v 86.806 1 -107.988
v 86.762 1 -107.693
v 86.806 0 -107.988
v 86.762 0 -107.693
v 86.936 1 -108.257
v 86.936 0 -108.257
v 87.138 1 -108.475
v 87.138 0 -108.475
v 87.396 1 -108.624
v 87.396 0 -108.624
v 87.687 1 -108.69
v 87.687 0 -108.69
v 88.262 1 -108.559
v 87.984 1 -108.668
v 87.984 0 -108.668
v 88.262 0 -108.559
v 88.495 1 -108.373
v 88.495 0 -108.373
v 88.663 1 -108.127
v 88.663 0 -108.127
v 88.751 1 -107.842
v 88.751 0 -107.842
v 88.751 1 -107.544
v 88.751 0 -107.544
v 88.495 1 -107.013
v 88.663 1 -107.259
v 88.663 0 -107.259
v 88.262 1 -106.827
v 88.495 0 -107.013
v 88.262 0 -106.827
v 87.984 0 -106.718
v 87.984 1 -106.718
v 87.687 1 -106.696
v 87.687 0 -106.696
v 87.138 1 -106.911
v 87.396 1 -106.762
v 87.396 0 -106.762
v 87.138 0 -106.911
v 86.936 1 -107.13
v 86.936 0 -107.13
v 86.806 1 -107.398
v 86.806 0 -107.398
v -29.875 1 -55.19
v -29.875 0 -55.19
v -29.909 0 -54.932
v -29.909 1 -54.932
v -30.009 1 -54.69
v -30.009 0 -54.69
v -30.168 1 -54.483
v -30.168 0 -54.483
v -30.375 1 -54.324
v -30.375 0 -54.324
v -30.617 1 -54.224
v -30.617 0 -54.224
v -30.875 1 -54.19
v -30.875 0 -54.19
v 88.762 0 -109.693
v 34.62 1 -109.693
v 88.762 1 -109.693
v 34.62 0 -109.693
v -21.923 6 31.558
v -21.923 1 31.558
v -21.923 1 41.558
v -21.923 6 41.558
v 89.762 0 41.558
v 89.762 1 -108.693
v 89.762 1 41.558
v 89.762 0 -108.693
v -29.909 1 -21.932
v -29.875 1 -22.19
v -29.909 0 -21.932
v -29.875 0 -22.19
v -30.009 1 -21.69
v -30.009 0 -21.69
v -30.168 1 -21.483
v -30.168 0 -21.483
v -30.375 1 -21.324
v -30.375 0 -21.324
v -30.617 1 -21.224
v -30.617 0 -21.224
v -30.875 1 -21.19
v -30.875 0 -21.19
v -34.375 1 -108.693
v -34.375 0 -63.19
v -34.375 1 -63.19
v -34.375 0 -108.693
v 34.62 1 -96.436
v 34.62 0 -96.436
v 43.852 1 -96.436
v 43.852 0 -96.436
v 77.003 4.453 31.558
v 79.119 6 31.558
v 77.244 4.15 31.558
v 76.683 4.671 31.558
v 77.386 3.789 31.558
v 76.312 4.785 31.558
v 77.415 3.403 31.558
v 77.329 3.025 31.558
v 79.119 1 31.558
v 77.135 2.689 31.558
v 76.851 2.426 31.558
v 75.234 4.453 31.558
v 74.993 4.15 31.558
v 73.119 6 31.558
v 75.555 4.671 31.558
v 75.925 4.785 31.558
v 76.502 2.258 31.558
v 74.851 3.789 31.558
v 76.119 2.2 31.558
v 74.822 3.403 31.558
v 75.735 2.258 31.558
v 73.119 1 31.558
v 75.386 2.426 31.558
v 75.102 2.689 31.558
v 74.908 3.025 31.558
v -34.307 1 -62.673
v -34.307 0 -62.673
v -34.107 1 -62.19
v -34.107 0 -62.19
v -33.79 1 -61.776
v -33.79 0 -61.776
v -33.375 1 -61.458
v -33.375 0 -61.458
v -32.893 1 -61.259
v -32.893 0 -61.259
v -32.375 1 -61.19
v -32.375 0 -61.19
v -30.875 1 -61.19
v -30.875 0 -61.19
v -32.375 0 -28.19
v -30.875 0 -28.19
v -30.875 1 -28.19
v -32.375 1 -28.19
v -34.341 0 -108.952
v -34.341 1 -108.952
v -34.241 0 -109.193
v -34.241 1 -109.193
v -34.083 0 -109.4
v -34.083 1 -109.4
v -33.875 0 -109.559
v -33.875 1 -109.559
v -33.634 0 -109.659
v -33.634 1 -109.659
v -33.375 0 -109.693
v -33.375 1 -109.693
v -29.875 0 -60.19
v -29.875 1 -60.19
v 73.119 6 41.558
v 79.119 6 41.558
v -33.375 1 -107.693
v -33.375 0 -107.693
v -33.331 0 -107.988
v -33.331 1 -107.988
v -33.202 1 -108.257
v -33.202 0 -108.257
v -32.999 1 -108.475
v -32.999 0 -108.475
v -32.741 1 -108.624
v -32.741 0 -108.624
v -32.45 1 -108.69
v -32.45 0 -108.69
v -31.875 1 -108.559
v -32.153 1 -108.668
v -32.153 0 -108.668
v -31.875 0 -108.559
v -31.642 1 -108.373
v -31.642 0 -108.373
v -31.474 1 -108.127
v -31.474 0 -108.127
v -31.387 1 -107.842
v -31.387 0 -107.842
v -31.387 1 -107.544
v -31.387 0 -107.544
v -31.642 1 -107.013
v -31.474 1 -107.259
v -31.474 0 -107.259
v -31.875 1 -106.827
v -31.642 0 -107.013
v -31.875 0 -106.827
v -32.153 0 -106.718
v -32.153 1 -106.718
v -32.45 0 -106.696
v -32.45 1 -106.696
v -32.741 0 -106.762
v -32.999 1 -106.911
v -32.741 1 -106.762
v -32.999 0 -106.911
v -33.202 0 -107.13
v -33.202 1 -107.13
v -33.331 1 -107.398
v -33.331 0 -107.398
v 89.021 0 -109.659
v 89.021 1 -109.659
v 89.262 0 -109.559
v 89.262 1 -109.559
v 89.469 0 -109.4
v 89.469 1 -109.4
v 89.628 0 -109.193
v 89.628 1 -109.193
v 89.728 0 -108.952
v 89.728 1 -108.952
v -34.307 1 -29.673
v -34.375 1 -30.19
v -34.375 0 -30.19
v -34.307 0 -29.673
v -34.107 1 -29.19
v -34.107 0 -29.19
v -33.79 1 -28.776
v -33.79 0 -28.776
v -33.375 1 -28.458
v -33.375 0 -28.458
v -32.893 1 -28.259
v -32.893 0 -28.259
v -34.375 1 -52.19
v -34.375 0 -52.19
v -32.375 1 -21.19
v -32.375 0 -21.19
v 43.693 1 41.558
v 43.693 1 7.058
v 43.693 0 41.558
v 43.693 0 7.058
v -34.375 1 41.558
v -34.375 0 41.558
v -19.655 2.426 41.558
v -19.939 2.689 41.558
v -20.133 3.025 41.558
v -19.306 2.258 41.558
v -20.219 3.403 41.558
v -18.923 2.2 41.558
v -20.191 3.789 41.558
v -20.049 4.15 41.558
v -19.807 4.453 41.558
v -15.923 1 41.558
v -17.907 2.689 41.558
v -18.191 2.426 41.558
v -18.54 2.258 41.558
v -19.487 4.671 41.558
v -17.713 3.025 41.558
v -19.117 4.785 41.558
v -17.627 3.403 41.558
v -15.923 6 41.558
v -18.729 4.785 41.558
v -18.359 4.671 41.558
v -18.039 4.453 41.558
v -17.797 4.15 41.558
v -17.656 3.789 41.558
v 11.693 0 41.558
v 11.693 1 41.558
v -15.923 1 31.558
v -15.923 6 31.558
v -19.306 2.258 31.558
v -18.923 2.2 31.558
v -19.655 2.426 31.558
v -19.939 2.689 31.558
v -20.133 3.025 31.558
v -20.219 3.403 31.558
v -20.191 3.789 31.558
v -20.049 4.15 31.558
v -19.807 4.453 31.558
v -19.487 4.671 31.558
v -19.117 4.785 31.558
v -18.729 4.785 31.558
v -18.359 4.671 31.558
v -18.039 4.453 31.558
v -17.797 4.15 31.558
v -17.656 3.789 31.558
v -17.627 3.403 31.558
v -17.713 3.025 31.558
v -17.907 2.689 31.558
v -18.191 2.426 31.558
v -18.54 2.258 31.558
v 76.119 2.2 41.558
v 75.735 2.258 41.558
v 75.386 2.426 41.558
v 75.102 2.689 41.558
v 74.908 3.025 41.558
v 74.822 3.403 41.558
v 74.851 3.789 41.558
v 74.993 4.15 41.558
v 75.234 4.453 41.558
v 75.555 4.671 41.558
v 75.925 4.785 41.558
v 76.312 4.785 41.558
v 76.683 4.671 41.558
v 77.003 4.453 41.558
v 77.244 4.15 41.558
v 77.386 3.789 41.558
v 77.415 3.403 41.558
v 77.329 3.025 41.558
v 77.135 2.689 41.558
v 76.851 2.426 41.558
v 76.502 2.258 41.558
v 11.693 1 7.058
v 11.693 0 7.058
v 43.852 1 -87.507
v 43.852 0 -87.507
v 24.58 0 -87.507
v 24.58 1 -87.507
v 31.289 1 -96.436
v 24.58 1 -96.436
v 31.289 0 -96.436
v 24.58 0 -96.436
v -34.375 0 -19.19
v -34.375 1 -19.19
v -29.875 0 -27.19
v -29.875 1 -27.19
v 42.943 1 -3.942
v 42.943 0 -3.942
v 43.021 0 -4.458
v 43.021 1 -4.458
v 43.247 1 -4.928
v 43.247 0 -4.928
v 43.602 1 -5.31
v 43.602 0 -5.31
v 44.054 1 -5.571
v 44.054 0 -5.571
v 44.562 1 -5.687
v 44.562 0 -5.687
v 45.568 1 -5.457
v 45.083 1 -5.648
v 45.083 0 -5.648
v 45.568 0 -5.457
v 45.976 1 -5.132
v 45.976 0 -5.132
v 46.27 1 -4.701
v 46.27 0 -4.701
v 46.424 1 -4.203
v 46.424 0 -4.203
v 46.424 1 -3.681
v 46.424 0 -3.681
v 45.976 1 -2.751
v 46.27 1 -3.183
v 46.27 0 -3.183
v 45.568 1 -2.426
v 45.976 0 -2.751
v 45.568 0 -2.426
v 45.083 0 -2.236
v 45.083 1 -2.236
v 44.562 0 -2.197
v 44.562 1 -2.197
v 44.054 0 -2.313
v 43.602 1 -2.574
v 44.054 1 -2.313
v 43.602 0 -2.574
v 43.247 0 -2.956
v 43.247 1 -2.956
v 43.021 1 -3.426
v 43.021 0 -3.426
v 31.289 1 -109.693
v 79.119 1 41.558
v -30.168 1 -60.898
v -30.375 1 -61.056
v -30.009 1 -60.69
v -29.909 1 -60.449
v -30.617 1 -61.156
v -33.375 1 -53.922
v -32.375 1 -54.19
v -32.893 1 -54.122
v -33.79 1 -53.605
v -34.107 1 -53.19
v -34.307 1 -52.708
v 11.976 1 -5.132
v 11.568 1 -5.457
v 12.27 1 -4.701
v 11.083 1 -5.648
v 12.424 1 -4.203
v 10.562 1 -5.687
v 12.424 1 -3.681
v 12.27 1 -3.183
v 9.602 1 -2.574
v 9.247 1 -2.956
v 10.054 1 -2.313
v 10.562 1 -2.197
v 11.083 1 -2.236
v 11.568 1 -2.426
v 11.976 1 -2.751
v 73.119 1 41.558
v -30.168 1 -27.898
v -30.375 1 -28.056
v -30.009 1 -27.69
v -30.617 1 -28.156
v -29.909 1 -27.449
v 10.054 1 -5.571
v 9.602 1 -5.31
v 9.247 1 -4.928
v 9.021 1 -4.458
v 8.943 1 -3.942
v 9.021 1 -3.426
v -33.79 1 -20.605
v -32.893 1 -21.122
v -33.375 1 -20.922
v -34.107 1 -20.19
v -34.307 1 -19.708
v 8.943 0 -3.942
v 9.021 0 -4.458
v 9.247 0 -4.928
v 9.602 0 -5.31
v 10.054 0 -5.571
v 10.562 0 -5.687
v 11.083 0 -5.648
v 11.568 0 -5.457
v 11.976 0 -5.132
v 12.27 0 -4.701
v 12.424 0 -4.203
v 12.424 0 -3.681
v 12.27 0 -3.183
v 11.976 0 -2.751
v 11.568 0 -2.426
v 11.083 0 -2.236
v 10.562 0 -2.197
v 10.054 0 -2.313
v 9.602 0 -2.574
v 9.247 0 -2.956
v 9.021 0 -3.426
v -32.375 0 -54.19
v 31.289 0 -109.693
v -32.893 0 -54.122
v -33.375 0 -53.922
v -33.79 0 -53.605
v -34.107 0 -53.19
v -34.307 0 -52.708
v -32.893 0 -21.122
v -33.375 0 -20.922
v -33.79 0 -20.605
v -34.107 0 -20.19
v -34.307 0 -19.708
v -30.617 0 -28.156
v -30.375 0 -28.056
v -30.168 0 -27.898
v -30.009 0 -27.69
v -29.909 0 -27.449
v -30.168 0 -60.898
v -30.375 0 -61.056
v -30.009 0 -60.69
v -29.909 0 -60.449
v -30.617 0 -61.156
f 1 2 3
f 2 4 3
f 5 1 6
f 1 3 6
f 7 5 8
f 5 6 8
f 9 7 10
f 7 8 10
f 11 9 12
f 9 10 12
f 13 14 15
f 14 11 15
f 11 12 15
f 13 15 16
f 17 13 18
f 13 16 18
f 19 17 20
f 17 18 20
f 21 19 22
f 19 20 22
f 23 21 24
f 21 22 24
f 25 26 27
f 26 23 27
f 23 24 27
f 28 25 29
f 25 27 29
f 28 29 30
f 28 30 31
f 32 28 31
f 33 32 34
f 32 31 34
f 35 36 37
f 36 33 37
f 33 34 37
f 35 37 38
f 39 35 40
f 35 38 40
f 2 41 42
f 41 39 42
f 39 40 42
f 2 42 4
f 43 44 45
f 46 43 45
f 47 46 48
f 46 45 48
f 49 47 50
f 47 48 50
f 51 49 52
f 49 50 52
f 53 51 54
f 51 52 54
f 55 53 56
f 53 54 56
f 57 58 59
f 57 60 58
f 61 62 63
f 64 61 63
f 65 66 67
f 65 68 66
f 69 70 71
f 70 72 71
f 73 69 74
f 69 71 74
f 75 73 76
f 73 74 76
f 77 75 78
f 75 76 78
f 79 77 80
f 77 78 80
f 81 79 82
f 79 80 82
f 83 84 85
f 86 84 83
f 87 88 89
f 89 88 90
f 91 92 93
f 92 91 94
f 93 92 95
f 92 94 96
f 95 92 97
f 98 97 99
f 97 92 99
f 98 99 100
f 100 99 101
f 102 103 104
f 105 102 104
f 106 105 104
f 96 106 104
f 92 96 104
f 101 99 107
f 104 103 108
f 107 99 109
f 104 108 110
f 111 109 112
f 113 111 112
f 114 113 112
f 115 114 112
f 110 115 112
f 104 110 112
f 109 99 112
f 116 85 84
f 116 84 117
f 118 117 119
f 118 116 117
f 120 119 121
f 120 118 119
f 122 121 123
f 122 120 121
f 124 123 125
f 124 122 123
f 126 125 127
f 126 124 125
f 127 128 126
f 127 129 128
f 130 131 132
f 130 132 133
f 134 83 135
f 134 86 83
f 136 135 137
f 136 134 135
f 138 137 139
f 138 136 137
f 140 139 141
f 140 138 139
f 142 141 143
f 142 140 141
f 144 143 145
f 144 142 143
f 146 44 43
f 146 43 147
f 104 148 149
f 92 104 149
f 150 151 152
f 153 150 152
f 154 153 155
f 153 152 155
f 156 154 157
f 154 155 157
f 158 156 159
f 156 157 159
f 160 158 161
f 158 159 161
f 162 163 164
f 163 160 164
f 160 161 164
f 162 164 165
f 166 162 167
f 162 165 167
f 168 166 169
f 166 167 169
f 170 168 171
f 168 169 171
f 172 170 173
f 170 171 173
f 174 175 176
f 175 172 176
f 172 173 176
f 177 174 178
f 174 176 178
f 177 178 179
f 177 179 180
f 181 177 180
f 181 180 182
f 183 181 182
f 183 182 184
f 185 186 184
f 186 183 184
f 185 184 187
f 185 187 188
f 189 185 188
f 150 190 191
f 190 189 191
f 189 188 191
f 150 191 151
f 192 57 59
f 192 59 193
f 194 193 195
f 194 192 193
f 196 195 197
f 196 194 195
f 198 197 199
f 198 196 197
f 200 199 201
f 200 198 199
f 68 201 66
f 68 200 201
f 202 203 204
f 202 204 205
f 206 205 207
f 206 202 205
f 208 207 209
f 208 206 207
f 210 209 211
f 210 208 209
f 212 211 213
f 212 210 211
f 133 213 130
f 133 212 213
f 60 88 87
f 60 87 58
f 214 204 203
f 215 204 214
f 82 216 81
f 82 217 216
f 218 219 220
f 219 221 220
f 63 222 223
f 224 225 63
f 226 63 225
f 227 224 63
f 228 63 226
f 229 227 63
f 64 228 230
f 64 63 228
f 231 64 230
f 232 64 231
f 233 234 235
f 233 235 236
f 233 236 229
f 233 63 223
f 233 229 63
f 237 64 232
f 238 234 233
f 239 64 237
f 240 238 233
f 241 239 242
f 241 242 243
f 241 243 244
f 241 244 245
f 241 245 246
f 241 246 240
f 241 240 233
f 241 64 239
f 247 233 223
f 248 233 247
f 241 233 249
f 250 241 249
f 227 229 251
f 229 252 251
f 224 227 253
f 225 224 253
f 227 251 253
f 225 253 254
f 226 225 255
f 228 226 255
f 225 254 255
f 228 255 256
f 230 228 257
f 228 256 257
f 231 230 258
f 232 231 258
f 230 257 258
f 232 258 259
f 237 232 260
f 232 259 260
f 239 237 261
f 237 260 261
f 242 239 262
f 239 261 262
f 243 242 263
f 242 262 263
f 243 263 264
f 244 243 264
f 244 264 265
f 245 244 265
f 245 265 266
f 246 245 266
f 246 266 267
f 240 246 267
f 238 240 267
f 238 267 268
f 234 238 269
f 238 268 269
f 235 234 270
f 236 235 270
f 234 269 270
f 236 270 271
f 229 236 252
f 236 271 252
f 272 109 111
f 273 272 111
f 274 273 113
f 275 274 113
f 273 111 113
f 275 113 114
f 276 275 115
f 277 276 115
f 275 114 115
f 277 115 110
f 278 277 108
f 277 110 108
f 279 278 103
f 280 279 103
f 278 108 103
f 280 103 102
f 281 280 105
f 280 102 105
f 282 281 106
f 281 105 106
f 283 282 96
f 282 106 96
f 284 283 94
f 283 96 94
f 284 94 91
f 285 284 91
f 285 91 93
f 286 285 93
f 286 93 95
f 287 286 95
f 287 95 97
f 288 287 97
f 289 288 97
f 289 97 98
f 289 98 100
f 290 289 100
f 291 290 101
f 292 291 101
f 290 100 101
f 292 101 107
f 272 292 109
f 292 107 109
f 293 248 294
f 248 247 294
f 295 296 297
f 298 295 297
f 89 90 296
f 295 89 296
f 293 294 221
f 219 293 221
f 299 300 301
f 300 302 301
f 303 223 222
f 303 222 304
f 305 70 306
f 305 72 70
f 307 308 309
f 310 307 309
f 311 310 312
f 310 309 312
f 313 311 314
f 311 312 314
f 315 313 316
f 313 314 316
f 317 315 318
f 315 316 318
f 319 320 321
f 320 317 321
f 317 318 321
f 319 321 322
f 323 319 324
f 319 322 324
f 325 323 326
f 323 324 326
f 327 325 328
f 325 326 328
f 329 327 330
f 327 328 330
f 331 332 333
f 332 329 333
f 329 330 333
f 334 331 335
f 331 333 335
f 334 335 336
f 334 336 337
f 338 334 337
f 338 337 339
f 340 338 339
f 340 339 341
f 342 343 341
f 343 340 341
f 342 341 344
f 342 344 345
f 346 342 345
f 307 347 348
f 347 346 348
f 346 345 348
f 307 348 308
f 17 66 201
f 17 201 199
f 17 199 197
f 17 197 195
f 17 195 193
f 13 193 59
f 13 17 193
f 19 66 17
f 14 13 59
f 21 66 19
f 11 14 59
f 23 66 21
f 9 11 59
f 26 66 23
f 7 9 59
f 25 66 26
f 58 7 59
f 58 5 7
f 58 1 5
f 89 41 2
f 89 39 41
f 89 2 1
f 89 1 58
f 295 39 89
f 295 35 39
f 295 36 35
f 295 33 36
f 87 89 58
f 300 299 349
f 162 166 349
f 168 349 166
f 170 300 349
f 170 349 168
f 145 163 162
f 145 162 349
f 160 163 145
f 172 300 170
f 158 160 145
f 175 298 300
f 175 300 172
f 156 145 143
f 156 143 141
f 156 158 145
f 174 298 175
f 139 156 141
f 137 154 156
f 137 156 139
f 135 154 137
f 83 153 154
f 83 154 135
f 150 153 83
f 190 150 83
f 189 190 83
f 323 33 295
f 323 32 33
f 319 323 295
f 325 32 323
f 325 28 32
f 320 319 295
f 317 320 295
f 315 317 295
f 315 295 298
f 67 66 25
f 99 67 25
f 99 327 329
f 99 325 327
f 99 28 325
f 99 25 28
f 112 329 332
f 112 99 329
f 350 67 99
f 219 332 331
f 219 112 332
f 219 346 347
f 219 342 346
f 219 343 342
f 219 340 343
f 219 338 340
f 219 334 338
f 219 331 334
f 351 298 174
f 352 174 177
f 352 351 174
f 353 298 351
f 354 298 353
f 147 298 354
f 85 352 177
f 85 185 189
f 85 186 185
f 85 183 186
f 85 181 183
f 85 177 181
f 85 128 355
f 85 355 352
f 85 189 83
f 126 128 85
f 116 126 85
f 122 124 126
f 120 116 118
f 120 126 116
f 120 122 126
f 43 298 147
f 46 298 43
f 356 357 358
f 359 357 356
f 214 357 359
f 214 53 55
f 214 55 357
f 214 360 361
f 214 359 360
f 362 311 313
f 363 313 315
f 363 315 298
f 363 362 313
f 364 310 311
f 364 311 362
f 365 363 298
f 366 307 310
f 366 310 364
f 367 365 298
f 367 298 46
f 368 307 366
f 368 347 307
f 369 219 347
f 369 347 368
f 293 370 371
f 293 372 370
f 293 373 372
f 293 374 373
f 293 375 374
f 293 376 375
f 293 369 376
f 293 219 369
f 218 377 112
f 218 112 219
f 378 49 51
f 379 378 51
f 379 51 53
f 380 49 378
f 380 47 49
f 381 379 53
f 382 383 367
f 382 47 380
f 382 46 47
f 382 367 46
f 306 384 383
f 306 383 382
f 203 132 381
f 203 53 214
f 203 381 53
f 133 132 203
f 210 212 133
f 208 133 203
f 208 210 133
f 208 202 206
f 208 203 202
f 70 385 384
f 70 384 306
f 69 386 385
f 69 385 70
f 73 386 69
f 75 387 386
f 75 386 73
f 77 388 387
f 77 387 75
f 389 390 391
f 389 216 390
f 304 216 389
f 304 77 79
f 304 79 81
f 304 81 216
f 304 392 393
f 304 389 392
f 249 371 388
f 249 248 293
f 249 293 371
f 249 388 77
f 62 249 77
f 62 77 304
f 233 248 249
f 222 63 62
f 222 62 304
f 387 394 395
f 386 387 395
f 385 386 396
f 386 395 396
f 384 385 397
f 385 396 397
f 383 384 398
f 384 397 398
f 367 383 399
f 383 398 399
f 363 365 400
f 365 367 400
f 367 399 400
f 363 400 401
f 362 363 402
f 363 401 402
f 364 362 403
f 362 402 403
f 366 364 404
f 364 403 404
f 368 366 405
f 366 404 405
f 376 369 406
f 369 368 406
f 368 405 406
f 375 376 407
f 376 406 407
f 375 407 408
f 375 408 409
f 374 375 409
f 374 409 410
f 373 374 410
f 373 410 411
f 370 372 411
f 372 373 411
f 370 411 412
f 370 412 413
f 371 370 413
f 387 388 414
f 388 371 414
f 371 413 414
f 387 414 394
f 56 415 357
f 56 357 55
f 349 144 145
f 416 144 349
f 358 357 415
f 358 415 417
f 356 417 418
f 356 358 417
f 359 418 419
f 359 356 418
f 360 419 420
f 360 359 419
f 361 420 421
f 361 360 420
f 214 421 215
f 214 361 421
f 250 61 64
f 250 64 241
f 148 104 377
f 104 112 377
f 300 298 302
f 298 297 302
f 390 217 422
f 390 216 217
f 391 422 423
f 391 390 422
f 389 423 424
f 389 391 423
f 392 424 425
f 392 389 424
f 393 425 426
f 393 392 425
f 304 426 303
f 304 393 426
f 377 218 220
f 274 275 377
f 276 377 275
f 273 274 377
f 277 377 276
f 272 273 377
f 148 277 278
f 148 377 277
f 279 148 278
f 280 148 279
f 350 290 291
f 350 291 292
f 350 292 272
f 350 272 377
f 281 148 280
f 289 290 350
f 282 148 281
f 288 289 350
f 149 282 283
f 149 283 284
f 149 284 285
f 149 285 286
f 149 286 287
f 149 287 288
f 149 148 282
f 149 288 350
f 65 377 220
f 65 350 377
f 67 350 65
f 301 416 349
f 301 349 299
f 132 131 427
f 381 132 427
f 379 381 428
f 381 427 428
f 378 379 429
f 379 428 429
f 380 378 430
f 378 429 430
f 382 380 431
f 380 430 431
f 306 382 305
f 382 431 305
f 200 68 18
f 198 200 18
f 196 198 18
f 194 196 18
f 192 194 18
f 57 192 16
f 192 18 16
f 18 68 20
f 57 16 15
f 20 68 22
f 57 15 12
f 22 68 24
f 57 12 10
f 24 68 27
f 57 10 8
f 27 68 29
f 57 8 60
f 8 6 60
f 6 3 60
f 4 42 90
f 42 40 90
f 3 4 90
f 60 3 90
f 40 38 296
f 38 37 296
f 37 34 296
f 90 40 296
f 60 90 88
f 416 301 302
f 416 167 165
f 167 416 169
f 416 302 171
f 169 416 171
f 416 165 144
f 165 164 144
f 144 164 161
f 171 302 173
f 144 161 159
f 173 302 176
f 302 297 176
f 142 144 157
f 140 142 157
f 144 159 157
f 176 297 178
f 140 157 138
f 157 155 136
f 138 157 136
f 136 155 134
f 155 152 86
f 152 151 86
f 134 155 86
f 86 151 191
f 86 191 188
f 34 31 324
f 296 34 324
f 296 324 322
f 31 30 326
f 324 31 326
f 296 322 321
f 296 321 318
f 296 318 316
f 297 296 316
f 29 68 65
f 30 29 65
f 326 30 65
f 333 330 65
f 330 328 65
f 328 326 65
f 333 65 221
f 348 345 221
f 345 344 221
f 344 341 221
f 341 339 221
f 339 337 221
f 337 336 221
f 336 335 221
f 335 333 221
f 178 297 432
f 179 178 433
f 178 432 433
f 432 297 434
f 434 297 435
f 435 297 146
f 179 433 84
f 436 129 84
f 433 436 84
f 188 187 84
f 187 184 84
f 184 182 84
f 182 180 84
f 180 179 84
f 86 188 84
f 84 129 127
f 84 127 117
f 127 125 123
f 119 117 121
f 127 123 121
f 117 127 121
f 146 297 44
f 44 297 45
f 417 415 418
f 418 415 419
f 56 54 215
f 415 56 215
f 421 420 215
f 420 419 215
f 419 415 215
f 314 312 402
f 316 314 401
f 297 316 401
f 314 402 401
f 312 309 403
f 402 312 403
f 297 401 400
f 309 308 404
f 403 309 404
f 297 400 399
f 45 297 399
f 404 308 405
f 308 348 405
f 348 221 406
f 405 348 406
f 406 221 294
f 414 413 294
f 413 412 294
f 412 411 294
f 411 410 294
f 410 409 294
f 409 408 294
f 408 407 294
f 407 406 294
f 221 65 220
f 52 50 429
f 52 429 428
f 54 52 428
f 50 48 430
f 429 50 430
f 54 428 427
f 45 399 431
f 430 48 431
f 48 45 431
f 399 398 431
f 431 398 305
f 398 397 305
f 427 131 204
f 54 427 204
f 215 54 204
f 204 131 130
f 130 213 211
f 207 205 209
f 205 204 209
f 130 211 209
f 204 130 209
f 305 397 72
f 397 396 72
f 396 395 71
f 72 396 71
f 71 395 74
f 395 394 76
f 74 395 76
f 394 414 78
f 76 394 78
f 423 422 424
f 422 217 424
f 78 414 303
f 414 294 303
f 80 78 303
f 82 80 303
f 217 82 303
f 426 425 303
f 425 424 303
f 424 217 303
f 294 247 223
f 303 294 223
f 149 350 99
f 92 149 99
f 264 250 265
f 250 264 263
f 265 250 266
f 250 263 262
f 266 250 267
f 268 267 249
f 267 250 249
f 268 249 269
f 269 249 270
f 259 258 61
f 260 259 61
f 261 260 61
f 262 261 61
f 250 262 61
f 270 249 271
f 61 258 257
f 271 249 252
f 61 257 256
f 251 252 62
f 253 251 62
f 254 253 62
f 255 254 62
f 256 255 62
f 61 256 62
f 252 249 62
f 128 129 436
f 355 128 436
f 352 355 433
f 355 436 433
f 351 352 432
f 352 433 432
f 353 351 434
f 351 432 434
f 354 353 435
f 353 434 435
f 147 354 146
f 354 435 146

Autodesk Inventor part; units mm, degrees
ref_plane "YZ Plane" through (0, 0, 0) normal (1, 0, 0) x (0, 1, 0)
ref_plane "XZ Plane" through (0, 0, 0) normal (0, 1, 0) x (-1, 0, 0)
ref_plane "XY Plane" through (0, 0, 0) normal (0, 0, 1) x (1, 0, 0)
sketch "Sketch1" plane through (0, 0, 0) normal (0, 1, 0) x (-1, 0, 0)
  line L0 (-90.1493, 193.0734) -> (34.8507, 193.0734) construction
  line L1 (34.8507, 193.0734) -> (34.8507, 51.5734) construction
  line L2 (34.8507, 51.5734) -> (28.8507, 51.5734) construction
  line L3 (28.8507, 51.5734) -> (28.8507, 31.5734) construction
  line L4 (34.8507, 31.5734) -> (28.8507, 31.5734) construction
  line L5 (34.8507, 31.5734) -> (34.8507, -109.9266) construction
  line L6 (34.8507, -109.9266) -> (-90.1493, -109.9266) construction
  line L7 (-90.1493, -109.9266) -> (-90.1493, 31.5734) construction
  line L8 (-90.1493, 31.5734) -> (-84.1493, 31.5734) construction
  line L9 (-84.1493, 51.5734) -> (-84.1493, 31.5734) construction
  line L10 (-90.1493, 51.5734) -> (-84.1493, 51.5734) construction
  line L11 (-90.1493, 51.5734) -> (-90.1493, 193.0734) construction
  line L12 (-91.6493, 194.5734) -> (-91.6493, -111.4266) construction
  line L13 (-91.6493, -111.4266) -> (36.3507, -111.4266) construction
  line L14 (36.3507, -111.4266) -> (36.3507, 194.5734) construction
  line L15 (36.3507, 194.5734) -> (-91.6493, 194.5734) construction
  circle A0 centre (-88.1493, -107.9266) radius 1.1 construction
  line L16 (-86.1493, -109.9266) -> (-90.1493, -109.9266) construction
  line L17 (-86.1493, -109.9266) -> (-86.1493, -105.9266) construction
  line L18 (-86.1493, -105.9266) -> (-90.1493, -105.9266) construction
  line L19 (-90.1493, -109.9266) -> (-90.1493, -105.9266) construction
  line L20 (34.8507, -109.9266) -> (30.8507, -109.9266) construction
  line L21 (34.8507, -105.9687) -> (34.8507, -109.9266) construction
  line L22 (34.8507, -105.9687) -> (30.8507, -105.9687) construction
  line L23 (30.8507, -105.9687) -> (30.8507, -109.9266) construction
  circle A1 centre (32.8507, -107.9687) radius 1.1 construction
  circle A2 centre (-88.1493, 191.0734) radius 1.1 construction
  line L24 (-90.1493, 189.0734) -> (-90.1493, 193.0734) construction
  line L25 (-90.1493, 189.0734) -> (-86.1493, 189.0734) construction
  line L26 (-86.1493, 189.0734) -> (-86.1493, 193.0734) construction
  line L27 (-90.1493, 193.0734) -> (-86.1493, 193.0734) construction
  circle A3 centre (32.8507, 191.0734) radius 1.1 construction
  line L28 (30.8507, 193.0734) -> (34.8507, 193.0734) construction
  line L29 (30.8507, 193.0734) -> (30.8507, 189.0734) construction
  line L30 (30.8507, 189.0734) -> (34.8507, 189.0734) construction
  line L31 (34.8507, 193.0734) -> (34.8507, 189.0734) construction
  point P0 (0, 0)
  point P1 (0, 0)
sketch "Sketch2" plane through (0, 0, 0) normal (0, 1, 0) x (-1, 0, 0)
  line L0 (-89.7618, 28.8226) -> (-89.7618, 191.8096)
  line L1 (-88.7618, 192.8096) -> (33.3754, 192.8096)
  line L2 (34.3754, 191.8096) -> (34.3754, -108.6932)
  line L3 (-89.7618, -108.6932) -> (-89.7618, 28.8226)
  circle A0 centre (-87.7618, -107.6932) radius 1
  circle A1 centre (32.3754, -107.6932) radius 1
  line L4 (34.3754, 28.9308) -> (34.3754, -108.6932)
  circle A2 centre (-87.7618, 190.8096) radius 1
  circle A3 centre (32.3754, 190.8096) radius 1
  arc A4 (34.3754, 191.8096) -> (33.3754, 192.8096) centre (33.3754, 191.8096) ccw
  arc A5 (-88.7618, 192.8096) -> (-89.7618, 191.8096) centre (-88.7618, 191.8096) ccw
  arc A6 (-89.7618, -108.6932) -> (-88.7618, -109.6932) centre (-88.7618, -108.6932) ccw
  arc A7 (33.3754, -109.6932) -> (34.3754, -108.6932) centre (33.3754, -108.6932) ccw
  line L5 (-43.6932, 76.0582) -> (-11.6932, 76.0582)
  line L6 (-11.6932, 76.0582) -> (-11.6932, 7.0582)
  line L7 (-11.6932, 7.0582) -> (-43.6932, 7.0582)
  line L8 (-43.6932, 7.0582) -> (-43.6932, 76.0582)
  circle A8 centre (-44.6932, 80.8582) radius 1.75
  circle A9 centre (-10.6932, 80.8582) radius 1.75
  circle A10 centre (-10.6932, -3.9418) radius 1.75
  circle A11 centre (-44.6932, -3.9418) radius 1.75
  line L9 (-43.8518, -87.5066) -> (-24.58, -87.5066)
  line L10 (-24.58, -87.5066) -> (-24.58, -96.4362)
  line L11 (-43.8518, -96.4362) -> (-43.8518, -87.5066)
  line L12 (-34.6195, -96.4362) -> (-34.6195, -109.6932)
  line L13 (-31.2888, -109.6932) -> (-31.2888, -96.4362)
  line L14 (-24.58, -96.4362) -> (-31.2888, -96.4362)
  line L15 (-34.6195, -96.4362) -> (-43.8518, -96.4362)
  line L16 (33.3754, -109.6932) -> (-31.2888, -109.6932)
  line L17 (-34.6195, -109.6932) -> (-88.7618, -109.6932)
  line L18 (34.0825, -109.4003) -> (-89.4689, 192.5167) construction
  line L19 (-89.4689, -109.4003) -> (34.0825, 192.5167) construction
  line L20 (-27.6932, 41.5582) -> (9.3943, 41.5582) construction
  point P0 (0, 0)
  point P1 (-89.7618, 188.8096)
  point P2 (-85.7618, 192.8096)
  point P3 (-89.7618, 192.8096)
  dimension "d3" = 1
  dimension "d47" = 69
  dimension "d48" = 32
  dimension "d52" = 34.5
  dimension "d53" = 16
  dimension "d54" = 3.5
  dimension "d55" = 3.5
  dimension "d56" = 3.5
  dimension "d57" = 3.5
  dimension "d59" = 0
  dimension "d62" = 0
  dimension "d64" = 0
  dimension "d65" = 0
  dimension "d66" = 11
  dimension "d67" = 4.8
  dimension "d68" = 1
  dimension "d69" = 1
  dimension "d87" = 2
  dimension "d88" = 2
  dimension "d89" = 2
  dimension "d90" = 2
  dimension "d91" = 2
  dimension "d92" = 2
  dimension "d93" = 2
  dimension "d94" = 2
  dimension "d95" = 2
  dimension "d96" = 2
  dimension "d97" = 2
  dimension "d98" = 2
extrude "Extrusion1" add sketch "Sketch2" along normal blind 1
ref_plane "Work Plane1" through (-33.3754, 0, 41.5582) normal (0, 0, 1) x (1, 0, 0)
sketch "Sketch4" plane through (0, 1, 0) normal (0, 1, 0) x (1, 0, 0)
  line L0 (79.1186, -31.5582) -> (73.1186, -31.5582)
  line L1 (73.1186, -31.5582) -> (73.1186, -51.5582)
  line L2 (73.1186, -51.5582) -> (79.1186, -51.5582)
  line L3 (79.1186, -51.5582) -> (79.1186, -31.5582)
  line L4 (117.2493, -41.5582) -> (-61.9507, -41.5582) projected
  line L5 (-15.9231, -31.5582) -> (-21.9231, -31.5582)
  line L6 (-21.9231, -31.5582) -> (-21.9231, -51.5582)
  line L7 (-21.9231, -51.5582) -> (-15.9231, -51.5582)
  line L8 (-15.9231, -51.5582) -> (-15.9231, -31.5582)
  dimension "d10" = 6
  dimension "d11" = 20
  dimension "d12" = 10
  dimension "d13" = 6
  dimension "d14" = 20
  dimension "d15" = 10
extrude "Extrusion2" add sketch "Sketch4" along normal blind 5
sketch "Sketch6" plane through (-21.9231, 1, 51.5582) normal (0, 0, 1) x (1, 0, 0)
  line L0 (0, 5) -> (6, 5) projected
  line L1 (0, 0) -> (0, 5) projected
  line L2 (95.0417, 5) -> (101.0417, 5) projected
  line L3 (95.0417, 0) -> (95.0417, 5) projected
  point P0 (21.9231, -1)
  point P1 (3, 2.5)
  point P2 (98.0417, 2.5)
  dimension "d22" = 2.5
  dimension "d23" = 3
  dimension "d24" = 2.5
  dimension "d25" = 3
hole "Hole1" at (-18.9231, 3.5, 51.5582) at (76.1186, 3.5, 51.5582) direction (0, 0, -1) diameter 2.6 depth 5 countersink diameter 5 countersink angle 82
sketch "Sketch7" plane through (-18.9231, 3.5, 46.5582) normal (0, 0, 1) x (1, 0, 0)
  circle A0 centre (0, 0) radius 1.3 projected
  point P0 (18.9231, -3.5)
hole "Hole2" at (-18.9231, 3.5, 46.5582) direction (0, 0, -1) diameter 2.6 depth 15 tip angle 118
sketch "Sketch8" plane through (76.1186, 3.5, 46.5582) normal (0, 0, 1) x (1, 0, 0)
  circle A0 centre (0, 0) radius 1.3 projected
  point P0 (-76.1186, -3.5)
hole "Hole3" at (76.1186, 3.5, 46.5582) direction (0, 0, -1) diameter 2.6 depth 15 tip angle 118
sketch "Sketch9" plane through (0, 0, 0) normal (0, -1, 0) x (1, 0, 0)
  line L0 (-34.3754, -108.6932) -> (-34.3754, 191.8096) projected
  line L1 (-34.3754, 137.8096) -> (-30.8754, 137.8096)
  line L2 (-29.8754, 136.8096) -> (-29.8754, 131.8096)
  line L3 (-30.8754, 130.8096) -> (-34.3754, 130.8096)
  line L4 (-34.3754, 130.8096) -> (-34.3754, 137.8096)
  line L5 (-34.3754, 104.8096) -> (-30.8754, 104.8096)
  line L6 (-29.8754, 103.8096) -> (-29.8754, 98.8096)
  line L7 (-30.8754, 97.8096) -> (-34.3754, 97.8096)
  line L8 (-34.3754, 97.8096) -> (-34.3754, 104.8096)
  line L9 (-34.3754, -21.1904) -> (-30.8754, -21.1904)
  line L10 (-29.8754, -22.1904) -> (-29.8754, -27.1904)
  line L11 (-30.8754, -28.1904) -> (-34.3754, -28.1904)
  line L12 (-34.3754, -28.1904) -> (-34.3754, -21.1904)
  line L13 (-34.3754, -54.1904) -> (-30.8754, -54.1904)
  line L14 (-29.8754, -55.1904) -> (-29.8754, -60.1904)
  line L15 (-30.8754, -61.1904) -> (-34.3754, -61.1904)
  line L16 (-34.3754, -61.1904) -> (-34.3754, -54.1904)
  line L17 (-33.3754, 192.8096) -> (88.7618, 192.8096) projected
  arc A0 (-29.8754, 136.8096) -> (-30.8754, 137.8096) centre (-30.8754, 136.8096) ccw
  arc A1 (-30.8754, 130.8096) -> (-29.8754, 131.8096) centre (-30.8754, 131.8096) ccw
  arc A2 (-29.8754, 103.8096) -> (-30.8754, 104.8096) centre (-30.8754, 103.8096) ccw
  arc A3 (-30.8754, 97.8096) -> (-29.8754, 98.8096) centre (-30.8754, 98.8096) ccw
  arc A4 (-29.8754, -22.1904) -> (-30.8754, -21.1904) centre (-30.8754, -22.1904) ccw
  arc A5 (-30.8754, -28.1904) -> (-29.8754, -27.1904) centre (-30.8754, -27.1904) ccw
  arc A6 (-29.8754, -55.1904) -> (-30.8754, -54.1904) centre (-30.8754, -55.1904) ccw
  arc A7 (-30.8754, -61.1904) -> (-29.8754, -60.1904) centre (-30.8754, -60.1904) ccw
  point P0 (0, 0)
  point P1 (-29.8754, 97.8096)
  point P2 (-29.8754, 104.8096)
  point P3 (-29.8754, -28.1904)
  point P4 (-29.8754, -21.1904)
  point P5 (-29.8754, -61.1904)
  point P6 (-29.8754, -54.1904)
  dimension "d70" = 55
  dimension "d71" = 7
  dimension "d72" = 7
  dimension "d73" = 26
  dimension "d74" = 26
  dimension "d75" = 7
  dimension "d76" = 7
  dimension "d77" = 119
  dimension "d78" = 4.5
  dimension "d79" = 4.5
  dimension "d80" = 1
  dimension "d81" = 1
extrude "Extrusion3" cut sketch "Sketch9" against normal through all
fillet "Fillet1" radius 2 8 edges at (-34.3754, 0.5, 137.8096) (-34.3754, 0.5, 130.8096) (-34.3754, 0.5, 104.8096) (-34.3754, 0.5, 97.8096) (-34.3754, 0.5, -21.1904) (-34.3754, 0.5, -28.1904) (-34.3754, 0.5, -54.1904) (-34.3754, 0.5, -61.1904)
sketch "Sketch11" plane through (0, 0, 0) normal (0, -1, 0) x (1, 0, 0)
  line L0 (-34.3754, 139.8096) -> (-34.3754, 191.8096) projected
  line L1 (-34.3754, 178.177) -> (-25.2482, 178.177)
  line L2 (-25.2482, 178.177) -> (-25.2482, 158.3724)
  line L3 (-25.2482, 158.3724) -> (-34.3754, 158.3724)
  line L4 (-34.3754, 158.3724) -> (-34.3754, 178.177)
  point P0 (0, 0)
extrude "Extrusion5" cut sketch "Sketch11" against normal through all
fillet "Fillet2" radius 3 4 edges at (-34.3754, 0.5, 178.177) (-25.2482, 0.5, 178.177) (-25.2482, 0.5, 158.3724) (-34.3754, 0.5, 158.3724)
sketch "Sketch10" plane through (-33.3754, 0, 41.5582) normal (0, 0, 1) x (1, 0, 0)
  line L0 (158.018, -104.466) -> (-19.6119, -104.466)
  line L1 (-19.6119, -104.466) -> (-19.6119, 75.8038)
  line L2 (-19.6119, 75.8038) -> (158.018, 75.8038)
  line L3 (158.018, 75.8038) -> (158.018, -104.466)
  point P0 (33.3754, 0)
extrude "Extrusion4" cut sketch "Sketch10" along normal through all
properties part number "Screen Plate"
